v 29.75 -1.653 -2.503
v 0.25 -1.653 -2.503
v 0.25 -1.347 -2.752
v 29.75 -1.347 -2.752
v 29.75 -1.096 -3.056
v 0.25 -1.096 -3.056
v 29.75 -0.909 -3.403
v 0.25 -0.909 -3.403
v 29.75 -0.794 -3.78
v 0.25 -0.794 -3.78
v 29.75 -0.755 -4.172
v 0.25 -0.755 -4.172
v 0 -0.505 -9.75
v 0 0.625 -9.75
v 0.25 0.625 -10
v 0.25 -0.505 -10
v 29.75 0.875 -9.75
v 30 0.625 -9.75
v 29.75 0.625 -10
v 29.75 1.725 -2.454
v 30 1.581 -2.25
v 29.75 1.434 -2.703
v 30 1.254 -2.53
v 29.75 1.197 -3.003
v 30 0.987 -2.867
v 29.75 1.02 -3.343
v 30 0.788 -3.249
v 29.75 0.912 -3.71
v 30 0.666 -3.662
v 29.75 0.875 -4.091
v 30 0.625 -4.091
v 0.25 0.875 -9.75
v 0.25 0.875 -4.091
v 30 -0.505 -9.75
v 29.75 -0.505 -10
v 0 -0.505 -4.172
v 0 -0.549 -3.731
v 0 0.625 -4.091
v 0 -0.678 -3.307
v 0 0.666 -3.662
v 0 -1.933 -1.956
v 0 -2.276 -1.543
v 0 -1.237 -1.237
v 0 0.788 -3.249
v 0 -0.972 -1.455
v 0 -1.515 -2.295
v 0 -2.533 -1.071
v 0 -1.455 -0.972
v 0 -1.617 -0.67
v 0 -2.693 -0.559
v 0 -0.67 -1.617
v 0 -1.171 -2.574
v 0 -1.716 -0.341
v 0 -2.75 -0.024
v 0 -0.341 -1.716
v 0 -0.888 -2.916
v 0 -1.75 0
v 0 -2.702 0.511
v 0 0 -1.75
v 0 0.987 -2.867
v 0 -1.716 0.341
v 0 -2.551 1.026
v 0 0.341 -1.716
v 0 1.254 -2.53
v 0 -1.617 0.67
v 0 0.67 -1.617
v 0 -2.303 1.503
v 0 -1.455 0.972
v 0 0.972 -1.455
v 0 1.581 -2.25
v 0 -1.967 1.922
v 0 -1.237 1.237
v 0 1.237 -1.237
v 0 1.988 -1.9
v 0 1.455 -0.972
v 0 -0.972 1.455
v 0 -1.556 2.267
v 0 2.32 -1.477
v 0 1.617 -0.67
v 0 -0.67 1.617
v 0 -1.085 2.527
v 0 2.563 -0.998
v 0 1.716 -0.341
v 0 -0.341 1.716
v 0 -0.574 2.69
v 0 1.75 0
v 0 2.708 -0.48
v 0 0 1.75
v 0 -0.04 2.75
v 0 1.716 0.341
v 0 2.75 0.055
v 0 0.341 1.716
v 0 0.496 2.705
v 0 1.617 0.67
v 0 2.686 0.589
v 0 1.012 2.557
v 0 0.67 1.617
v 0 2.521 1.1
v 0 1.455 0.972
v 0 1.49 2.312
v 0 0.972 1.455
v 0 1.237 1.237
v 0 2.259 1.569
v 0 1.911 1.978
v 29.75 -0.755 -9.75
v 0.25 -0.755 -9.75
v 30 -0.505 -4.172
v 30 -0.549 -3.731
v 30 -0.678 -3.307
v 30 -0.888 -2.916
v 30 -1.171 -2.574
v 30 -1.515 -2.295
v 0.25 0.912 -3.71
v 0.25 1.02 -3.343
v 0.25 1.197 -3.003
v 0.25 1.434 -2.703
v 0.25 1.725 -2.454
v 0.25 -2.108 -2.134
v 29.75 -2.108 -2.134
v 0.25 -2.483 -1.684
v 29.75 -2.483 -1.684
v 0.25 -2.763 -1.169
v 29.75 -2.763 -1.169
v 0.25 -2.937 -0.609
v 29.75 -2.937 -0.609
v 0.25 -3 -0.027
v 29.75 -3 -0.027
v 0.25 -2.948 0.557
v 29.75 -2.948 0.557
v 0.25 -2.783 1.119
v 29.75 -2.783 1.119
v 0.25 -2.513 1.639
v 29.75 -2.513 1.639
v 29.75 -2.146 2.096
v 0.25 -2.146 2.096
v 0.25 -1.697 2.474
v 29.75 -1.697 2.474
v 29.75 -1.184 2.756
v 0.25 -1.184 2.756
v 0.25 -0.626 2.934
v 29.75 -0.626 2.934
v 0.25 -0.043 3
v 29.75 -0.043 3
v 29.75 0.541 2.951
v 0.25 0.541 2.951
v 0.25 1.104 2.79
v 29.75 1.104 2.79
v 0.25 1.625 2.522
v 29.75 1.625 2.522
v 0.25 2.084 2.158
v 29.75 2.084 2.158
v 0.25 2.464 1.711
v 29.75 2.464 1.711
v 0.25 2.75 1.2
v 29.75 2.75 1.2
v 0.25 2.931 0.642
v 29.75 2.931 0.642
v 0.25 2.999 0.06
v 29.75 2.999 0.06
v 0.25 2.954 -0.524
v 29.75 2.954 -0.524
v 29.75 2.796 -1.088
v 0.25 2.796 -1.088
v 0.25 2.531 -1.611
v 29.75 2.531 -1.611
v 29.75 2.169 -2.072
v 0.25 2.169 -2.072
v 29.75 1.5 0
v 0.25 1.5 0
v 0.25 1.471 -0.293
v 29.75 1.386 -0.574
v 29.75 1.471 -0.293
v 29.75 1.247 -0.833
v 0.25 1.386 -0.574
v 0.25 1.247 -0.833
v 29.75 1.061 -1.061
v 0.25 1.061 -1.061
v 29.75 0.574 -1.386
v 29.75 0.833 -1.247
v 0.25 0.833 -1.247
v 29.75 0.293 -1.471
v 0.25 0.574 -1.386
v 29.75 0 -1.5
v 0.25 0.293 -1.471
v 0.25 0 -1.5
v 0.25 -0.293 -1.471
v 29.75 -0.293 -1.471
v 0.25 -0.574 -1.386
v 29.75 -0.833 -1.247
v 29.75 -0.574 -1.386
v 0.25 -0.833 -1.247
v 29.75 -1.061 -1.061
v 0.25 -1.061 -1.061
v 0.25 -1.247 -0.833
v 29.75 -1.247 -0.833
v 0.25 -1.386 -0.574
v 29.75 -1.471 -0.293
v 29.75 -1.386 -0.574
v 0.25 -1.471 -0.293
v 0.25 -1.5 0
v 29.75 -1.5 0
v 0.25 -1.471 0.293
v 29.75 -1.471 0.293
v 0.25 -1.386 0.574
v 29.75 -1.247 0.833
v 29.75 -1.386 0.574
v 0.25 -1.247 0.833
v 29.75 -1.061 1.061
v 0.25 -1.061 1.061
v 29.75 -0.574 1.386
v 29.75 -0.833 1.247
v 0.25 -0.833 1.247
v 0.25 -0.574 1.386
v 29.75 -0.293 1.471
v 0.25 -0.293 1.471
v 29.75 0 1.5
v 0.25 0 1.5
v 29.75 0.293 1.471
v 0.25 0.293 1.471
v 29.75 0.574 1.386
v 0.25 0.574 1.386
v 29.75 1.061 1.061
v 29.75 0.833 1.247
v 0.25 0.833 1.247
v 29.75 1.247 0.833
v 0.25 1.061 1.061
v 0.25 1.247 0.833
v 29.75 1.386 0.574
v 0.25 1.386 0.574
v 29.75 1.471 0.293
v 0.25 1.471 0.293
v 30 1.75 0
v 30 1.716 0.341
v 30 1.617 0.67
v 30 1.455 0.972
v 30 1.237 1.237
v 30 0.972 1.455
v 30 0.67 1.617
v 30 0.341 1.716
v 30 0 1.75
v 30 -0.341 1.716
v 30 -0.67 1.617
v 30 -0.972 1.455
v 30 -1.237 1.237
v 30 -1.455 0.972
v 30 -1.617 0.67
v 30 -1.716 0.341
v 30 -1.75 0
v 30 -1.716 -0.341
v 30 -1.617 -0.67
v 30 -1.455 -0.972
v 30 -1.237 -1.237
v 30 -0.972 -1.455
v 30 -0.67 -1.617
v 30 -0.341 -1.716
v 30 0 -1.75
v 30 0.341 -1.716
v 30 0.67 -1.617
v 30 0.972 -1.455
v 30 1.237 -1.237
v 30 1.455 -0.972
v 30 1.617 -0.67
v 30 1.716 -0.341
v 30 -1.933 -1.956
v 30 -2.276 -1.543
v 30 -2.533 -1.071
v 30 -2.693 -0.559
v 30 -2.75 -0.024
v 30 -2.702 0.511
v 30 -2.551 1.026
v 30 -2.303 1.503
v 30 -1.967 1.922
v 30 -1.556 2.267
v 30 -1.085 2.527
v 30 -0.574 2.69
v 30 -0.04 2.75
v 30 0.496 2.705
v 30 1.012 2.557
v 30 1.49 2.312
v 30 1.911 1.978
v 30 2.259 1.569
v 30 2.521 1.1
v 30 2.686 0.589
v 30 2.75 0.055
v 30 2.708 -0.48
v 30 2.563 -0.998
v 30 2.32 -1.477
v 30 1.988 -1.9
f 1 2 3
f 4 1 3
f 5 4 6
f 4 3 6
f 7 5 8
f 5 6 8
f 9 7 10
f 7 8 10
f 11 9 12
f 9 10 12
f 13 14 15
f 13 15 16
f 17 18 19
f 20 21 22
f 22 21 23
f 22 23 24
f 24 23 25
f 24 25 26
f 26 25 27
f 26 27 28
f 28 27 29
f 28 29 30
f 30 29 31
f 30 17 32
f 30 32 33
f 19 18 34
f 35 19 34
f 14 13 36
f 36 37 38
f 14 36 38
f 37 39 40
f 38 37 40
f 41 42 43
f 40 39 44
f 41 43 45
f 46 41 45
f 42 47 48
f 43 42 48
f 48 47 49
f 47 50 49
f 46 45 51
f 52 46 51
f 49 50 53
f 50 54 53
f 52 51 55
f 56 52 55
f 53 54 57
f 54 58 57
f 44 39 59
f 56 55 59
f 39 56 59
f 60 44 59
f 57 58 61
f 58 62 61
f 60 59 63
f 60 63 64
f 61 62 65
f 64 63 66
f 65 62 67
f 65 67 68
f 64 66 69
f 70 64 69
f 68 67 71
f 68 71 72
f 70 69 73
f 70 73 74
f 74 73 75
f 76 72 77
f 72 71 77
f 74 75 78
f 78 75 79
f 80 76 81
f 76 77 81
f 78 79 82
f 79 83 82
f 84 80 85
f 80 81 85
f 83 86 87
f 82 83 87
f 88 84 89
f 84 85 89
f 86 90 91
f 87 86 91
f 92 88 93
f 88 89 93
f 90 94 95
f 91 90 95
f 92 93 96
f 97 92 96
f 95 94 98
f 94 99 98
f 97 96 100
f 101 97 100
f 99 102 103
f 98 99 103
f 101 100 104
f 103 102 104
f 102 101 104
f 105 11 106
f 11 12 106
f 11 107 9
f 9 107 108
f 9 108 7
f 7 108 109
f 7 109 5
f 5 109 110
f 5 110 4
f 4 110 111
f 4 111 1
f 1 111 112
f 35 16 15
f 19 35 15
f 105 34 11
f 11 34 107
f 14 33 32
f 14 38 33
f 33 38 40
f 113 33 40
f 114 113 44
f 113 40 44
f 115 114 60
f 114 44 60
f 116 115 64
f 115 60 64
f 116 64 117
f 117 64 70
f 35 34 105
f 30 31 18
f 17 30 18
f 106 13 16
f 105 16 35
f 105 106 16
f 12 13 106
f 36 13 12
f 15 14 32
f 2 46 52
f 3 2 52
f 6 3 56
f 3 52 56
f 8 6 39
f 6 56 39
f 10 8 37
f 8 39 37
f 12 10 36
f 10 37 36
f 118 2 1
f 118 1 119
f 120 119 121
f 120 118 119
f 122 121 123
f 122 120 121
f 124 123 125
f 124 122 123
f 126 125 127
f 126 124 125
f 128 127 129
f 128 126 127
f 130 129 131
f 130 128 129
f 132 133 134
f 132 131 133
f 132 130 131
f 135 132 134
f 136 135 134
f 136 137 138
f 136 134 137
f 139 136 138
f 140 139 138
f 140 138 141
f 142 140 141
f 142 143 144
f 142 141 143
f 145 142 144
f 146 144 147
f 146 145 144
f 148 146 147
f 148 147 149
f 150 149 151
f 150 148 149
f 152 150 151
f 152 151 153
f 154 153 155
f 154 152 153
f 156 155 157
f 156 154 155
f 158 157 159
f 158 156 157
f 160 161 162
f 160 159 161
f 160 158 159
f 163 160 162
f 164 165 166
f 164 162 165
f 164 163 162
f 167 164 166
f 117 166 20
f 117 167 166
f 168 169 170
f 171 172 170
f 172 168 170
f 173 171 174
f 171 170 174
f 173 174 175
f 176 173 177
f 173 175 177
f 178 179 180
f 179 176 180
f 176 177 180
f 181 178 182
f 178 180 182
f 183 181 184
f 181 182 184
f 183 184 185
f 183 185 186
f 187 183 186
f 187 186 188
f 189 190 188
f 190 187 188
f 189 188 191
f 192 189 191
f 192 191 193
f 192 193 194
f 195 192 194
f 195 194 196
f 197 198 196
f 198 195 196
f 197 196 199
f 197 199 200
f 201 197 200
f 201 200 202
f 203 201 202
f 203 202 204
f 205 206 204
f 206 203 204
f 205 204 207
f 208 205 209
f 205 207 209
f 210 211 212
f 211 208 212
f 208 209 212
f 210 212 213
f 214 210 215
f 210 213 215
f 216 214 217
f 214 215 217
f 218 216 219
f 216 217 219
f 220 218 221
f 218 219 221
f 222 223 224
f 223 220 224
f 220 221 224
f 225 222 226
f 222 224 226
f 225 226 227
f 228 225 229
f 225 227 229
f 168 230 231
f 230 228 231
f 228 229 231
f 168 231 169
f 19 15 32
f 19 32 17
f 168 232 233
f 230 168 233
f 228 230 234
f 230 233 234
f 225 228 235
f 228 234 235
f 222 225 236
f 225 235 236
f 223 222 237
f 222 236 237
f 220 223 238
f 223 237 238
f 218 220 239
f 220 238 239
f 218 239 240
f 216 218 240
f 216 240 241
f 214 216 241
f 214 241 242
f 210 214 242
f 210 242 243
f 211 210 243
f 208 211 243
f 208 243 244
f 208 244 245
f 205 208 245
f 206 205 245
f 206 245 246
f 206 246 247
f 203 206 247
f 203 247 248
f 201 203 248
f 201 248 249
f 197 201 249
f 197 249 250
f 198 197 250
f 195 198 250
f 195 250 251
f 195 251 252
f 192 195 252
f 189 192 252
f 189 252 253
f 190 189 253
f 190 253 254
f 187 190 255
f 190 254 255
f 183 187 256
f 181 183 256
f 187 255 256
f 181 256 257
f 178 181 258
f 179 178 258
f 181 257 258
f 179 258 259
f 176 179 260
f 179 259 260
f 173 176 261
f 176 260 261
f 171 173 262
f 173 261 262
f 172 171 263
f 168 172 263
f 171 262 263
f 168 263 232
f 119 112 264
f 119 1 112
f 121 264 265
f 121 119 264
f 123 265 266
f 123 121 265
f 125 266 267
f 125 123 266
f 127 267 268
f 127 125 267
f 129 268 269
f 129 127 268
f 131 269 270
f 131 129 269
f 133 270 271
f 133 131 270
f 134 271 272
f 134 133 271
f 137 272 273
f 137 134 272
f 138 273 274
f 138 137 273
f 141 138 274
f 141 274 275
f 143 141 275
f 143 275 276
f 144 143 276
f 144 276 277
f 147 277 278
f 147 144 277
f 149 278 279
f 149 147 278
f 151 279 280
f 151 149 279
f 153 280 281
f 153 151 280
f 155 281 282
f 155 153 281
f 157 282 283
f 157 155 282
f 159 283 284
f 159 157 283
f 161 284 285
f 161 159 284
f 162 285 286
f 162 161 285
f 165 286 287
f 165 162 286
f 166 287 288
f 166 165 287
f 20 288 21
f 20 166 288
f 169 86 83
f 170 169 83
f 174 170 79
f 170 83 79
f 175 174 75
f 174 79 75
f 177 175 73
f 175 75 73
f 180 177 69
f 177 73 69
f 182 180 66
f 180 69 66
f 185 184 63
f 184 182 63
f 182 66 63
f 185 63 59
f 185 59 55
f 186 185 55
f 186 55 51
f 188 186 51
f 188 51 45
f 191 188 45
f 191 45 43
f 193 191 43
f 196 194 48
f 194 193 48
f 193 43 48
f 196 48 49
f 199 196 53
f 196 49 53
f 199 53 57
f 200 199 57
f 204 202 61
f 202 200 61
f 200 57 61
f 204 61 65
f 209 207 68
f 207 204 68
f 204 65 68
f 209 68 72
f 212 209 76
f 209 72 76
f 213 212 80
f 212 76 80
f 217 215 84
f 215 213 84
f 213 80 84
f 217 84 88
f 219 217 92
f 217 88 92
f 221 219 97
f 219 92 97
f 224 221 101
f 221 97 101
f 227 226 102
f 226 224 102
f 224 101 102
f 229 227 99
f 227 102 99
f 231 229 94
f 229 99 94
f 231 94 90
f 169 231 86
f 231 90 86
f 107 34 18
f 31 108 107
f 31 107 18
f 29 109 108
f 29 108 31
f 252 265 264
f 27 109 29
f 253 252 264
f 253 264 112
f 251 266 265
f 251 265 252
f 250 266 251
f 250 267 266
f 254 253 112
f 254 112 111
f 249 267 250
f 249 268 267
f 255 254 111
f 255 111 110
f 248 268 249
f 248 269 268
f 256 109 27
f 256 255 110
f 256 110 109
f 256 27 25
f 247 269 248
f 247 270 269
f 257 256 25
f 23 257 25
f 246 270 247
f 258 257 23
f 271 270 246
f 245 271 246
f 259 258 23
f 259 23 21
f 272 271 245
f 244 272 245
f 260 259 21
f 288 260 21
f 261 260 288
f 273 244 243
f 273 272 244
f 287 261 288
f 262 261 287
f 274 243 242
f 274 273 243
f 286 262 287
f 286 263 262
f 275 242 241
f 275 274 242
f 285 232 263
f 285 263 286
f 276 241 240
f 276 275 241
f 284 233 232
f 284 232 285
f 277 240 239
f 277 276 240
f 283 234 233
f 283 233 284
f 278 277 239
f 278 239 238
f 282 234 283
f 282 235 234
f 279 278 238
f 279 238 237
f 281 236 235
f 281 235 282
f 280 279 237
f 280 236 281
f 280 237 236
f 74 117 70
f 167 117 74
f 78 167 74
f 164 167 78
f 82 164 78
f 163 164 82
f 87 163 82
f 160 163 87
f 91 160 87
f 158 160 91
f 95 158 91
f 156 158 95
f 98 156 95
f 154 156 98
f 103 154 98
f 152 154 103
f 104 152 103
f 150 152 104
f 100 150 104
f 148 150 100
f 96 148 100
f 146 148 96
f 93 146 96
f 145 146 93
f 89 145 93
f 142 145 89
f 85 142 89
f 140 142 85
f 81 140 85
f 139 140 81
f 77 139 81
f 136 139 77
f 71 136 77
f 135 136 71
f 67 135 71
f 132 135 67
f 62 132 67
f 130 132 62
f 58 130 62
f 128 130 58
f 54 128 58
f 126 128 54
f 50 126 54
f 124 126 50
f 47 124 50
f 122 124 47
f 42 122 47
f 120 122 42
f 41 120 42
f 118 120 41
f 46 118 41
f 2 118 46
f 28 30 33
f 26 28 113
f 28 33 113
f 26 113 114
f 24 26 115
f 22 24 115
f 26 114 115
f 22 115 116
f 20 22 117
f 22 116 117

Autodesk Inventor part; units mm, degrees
ref_plane "YZ Plane" through (0, 0, 0) normal (1, 0, 0) x (0, 1, 0)
ref_plane "XZ Plane" through (0, 0, 0) normal (0, 1, 0) x (-1, 0, 0)
ref_plane "XY Plane" through (0, 0, 0) normal (0, 0, 1) x (1, 0, 0)
sketch "Sketch3" plane through (0, 0, 0) normal (1, 0, 0) x (0, 1, 0)
  circle A0 centre (0, 0) radius 1.5
  arc A1 (1.725, -2.4545) -> (-1.6531, -2.5034) centre (0, 0) ccw
  line L0 (-0.7552, -4.1724) -> (-0.7552, -10)
  line L1 (-0.7552, -10) -> (0.875, -10)
  line L2 (0.875, -10) -> (0.875, -4.0908)
  arc A2 (1.725, -2.4545) -> (0.875, -4.0908) centre (2.875, -4.0908) ccw
  arc A3 (-0.7552, -4.1724) -> (-1.6531, -2.5034) centre (-2.7552, -4.1724) ccw
  dimension "d4" = 3
  dimension "d5" = 6
  dimension "d7" = 2
extrude "Extrusion2" add sketch "Sketch3" along normal blind 30
chamfer "Chamfer1" distance 0.25 angle 45 16 edges at (30, 0.875, -7.0454) (30, 1.1002, -3.1688) (30, -0.0435, 2.9997) (30, -0.9939, -3.2248) (30, -0.7552, -7.0862) (30, 0.0599, -10) (30, -1.5, 0) (0, -1.5, 0) (0, -0.0435, 2.9997) (0, -0.9939, -3.2248) (0, -0.7552, -7.0862) (0, 1.1002, -3.1688) (0, 0.875, -7.0454) (0, 0.0599, -10) (15, 0.875, -10) (15, -0.7552, -10)
properties part number "CoinLock"
